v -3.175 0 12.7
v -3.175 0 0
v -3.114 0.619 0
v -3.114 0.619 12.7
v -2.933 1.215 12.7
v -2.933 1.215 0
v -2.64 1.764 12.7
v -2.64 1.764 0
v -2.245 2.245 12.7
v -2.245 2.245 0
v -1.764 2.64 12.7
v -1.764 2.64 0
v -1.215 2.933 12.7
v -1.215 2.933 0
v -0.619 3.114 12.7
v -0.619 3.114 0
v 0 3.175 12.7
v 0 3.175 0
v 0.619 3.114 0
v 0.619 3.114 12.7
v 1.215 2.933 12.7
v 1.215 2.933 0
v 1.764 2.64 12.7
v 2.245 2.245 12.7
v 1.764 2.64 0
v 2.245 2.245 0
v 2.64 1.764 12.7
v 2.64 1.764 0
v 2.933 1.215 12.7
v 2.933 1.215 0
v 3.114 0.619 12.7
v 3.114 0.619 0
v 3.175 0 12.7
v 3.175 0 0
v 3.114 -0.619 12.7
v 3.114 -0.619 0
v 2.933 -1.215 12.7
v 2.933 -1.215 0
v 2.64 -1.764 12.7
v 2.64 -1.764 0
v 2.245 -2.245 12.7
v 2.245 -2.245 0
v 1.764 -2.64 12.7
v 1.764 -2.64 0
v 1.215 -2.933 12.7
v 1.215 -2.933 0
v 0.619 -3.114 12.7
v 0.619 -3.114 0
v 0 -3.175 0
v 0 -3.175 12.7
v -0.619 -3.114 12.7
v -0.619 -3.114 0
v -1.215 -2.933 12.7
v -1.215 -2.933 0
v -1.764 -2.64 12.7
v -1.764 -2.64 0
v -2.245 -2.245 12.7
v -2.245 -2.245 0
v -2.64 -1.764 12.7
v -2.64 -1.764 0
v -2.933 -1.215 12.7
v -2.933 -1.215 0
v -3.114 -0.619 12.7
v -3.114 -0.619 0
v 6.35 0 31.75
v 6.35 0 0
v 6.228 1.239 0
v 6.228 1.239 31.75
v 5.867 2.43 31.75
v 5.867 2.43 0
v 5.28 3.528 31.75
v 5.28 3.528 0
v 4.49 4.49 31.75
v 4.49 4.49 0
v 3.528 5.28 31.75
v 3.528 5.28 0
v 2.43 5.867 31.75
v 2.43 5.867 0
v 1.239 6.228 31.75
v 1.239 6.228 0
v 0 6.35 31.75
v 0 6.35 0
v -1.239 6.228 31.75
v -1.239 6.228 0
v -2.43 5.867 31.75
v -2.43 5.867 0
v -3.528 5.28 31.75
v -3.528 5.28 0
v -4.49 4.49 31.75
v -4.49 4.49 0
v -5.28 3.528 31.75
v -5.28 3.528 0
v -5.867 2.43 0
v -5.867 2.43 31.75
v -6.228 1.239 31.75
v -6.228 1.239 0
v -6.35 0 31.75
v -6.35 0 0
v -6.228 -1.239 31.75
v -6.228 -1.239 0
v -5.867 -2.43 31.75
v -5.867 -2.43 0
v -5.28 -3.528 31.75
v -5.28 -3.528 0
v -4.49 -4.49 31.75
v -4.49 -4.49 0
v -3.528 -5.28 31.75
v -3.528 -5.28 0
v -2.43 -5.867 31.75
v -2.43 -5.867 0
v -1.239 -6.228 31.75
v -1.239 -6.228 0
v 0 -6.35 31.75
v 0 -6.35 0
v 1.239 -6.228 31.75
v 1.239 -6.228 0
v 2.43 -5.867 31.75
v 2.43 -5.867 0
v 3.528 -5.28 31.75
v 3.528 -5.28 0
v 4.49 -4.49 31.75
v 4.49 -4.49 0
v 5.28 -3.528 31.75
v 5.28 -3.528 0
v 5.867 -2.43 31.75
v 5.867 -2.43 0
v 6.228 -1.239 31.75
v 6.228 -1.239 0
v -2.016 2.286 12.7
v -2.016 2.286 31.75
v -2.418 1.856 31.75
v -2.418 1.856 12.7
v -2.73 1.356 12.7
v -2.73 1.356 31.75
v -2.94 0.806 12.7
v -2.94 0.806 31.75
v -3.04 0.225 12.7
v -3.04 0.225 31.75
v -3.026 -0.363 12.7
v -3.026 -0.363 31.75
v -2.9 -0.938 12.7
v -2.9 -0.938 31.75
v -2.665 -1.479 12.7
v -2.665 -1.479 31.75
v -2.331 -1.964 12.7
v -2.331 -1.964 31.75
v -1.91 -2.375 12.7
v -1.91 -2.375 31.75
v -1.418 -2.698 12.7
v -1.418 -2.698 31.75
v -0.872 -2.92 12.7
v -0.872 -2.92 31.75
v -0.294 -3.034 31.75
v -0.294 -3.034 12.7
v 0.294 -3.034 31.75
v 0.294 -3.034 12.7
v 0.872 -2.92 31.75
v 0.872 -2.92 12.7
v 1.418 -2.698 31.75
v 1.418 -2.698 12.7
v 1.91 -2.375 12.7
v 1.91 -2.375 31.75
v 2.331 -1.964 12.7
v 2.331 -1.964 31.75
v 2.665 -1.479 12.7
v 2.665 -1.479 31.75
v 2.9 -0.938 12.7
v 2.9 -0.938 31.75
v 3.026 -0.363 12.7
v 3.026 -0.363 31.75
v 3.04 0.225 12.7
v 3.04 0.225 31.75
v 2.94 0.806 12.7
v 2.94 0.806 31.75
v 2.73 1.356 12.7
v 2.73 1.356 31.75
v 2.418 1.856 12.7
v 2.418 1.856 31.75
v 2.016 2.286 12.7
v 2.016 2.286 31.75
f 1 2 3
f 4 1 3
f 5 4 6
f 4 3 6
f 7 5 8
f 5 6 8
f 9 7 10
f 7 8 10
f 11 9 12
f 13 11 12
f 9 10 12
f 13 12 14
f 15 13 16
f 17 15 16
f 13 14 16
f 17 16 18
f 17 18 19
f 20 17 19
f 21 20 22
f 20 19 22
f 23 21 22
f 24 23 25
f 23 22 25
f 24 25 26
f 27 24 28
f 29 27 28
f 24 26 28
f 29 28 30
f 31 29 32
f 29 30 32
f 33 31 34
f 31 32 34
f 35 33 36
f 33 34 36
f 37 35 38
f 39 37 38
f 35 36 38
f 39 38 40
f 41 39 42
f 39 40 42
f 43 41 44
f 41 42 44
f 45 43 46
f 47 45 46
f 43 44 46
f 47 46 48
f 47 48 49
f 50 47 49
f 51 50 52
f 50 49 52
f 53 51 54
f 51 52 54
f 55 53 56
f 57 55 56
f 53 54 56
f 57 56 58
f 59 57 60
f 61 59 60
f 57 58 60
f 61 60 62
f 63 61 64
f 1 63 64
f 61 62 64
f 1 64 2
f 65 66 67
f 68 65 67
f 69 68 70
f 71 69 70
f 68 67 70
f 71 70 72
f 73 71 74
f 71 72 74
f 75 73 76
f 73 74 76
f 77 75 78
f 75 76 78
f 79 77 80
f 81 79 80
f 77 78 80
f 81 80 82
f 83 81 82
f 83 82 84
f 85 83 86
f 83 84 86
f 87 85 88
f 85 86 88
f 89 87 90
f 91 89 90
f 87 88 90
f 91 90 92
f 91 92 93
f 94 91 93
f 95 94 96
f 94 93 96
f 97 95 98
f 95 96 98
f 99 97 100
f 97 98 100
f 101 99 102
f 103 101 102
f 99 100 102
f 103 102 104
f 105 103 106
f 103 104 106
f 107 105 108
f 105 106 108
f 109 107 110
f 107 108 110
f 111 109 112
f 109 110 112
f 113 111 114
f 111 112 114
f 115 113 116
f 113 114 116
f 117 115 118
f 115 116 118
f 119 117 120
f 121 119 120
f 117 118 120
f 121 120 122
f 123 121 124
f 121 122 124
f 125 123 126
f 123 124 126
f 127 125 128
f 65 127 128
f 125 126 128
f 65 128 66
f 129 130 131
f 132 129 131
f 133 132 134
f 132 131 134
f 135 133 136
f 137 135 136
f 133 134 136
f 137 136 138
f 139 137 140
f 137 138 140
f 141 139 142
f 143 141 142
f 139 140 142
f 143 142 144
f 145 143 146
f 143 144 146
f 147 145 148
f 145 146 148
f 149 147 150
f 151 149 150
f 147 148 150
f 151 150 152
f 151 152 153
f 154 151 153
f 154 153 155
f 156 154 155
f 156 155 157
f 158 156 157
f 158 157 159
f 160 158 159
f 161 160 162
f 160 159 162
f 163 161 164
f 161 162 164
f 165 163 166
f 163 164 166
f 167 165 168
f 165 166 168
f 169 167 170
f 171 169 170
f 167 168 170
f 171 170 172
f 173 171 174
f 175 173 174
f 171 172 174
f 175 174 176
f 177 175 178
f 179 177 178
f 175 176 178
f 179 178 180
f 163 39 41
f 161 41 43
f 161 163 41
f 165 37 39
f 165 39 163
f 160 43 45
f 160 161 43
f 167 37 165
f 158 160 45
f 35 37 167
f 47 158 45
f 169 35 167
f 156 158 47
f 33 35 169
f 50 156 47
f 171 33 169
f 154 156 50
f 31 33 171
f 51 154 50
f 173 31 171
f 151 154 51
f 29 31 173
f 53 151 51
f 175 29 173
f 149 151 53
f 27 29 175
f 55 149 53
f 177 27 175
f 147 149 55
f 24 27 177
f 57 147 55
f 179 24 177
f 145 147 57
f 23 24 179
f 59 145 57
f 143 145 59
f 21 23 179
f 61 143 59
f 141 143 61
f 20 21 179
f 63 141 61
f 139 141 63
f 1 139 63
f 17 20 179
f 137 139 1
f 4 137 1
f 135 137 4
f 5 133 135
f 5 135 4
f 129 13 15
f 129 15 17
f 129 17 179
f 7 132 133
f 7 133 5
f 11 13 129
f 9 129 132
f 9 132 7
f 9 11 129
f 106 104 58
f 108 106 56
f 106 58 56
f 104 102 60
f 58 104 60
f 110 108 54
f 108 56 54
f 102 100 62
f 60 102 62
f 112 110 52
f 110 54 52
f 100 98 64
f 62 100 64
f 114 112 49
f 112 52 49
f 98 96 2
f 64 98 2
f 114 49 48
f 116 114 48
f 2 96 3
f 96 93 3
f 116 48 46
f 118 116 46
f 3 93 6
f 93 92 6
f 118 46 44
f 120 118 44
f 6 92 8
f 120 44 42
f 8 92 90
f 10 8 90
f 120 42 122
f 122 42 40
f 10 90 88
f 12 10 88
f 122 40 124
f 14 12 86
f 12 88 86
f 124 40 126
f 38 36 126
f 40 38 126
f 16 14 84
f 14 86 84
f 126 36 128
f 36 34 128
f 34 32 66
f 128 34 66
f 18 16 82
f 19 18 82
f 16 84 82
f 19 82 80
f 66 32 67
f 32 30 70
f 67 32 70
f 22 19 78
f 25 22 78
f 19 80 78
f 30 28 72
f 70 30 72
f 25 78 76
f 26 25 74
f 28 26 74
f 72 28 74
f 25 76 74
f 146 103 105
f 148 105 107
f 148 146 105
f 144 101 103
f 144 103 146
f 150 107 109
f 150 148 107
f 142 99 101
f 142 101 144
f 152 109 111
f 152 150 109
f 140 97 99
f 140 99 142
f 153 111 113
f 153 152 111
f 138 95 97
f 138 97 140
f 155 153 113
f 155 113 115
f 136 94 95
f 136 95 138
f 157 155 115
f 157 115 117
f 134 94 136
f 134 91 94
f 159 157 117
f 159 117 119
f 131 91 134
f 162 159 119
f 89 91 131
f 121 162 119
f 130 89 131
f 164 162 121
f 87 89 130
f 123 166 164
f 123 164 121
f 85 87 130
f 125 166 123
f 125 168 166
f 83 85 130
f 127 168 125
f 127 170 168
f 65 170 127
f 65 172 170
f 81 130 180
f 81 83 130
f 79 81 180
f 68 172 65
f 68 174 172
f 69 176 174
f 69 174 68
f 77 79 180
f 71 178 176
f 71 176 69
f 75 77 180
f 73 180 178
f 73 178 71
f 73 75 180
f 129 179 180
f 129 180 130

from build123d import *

# Parameters (mm, degrees)
SKETCH1_R           = 6.35
BOSS_EXTRUDE1_DEPTH = 31.75
CUT_EXTRUDE1_DEPTH  = 19.05
SKETCH3_R           = 3.175
CUT_EXTRUDE2_DEPTH  = 12.7


with BuildPart() as part:
    # Sketch1 → Boss-Extrude1 (new body)
    with BuildSketch(Plane.XY):
        Circle(SKETCH1_R)
    extrude(amount=BOSS_EXTRUDE1_DEPTH)

    # Sketch2 → Cut-Extrude1 (cut)
    with BuildSketch(Plane.XY.offset(31.75)):
        with BuildLine():
            Line((2.016062499, 2.286), (-2.016062499, 2.286))
            ThreePointArc((-2.016062499, 2.286), (0, -3.048), (2.016062499, 2.286))
        make_face()
    extrude(amount=-CUT_EXTRUDE1_DEPTH, mode=Mode.SUBTRACT)

    # Sketch3 → Cut-Extrude2 (cut)
    with BuildSketch(Plane(origin=(0, 0, 0), x_dir=(-1, 0, 0), z_dir=(0, 0, -1))):
        Circle(SKETCH3_R)
    extrude(amount=-CUT_EXTRUDE2_DEPTH, mode=Mode.SUBTRACT)


solid = part.part
